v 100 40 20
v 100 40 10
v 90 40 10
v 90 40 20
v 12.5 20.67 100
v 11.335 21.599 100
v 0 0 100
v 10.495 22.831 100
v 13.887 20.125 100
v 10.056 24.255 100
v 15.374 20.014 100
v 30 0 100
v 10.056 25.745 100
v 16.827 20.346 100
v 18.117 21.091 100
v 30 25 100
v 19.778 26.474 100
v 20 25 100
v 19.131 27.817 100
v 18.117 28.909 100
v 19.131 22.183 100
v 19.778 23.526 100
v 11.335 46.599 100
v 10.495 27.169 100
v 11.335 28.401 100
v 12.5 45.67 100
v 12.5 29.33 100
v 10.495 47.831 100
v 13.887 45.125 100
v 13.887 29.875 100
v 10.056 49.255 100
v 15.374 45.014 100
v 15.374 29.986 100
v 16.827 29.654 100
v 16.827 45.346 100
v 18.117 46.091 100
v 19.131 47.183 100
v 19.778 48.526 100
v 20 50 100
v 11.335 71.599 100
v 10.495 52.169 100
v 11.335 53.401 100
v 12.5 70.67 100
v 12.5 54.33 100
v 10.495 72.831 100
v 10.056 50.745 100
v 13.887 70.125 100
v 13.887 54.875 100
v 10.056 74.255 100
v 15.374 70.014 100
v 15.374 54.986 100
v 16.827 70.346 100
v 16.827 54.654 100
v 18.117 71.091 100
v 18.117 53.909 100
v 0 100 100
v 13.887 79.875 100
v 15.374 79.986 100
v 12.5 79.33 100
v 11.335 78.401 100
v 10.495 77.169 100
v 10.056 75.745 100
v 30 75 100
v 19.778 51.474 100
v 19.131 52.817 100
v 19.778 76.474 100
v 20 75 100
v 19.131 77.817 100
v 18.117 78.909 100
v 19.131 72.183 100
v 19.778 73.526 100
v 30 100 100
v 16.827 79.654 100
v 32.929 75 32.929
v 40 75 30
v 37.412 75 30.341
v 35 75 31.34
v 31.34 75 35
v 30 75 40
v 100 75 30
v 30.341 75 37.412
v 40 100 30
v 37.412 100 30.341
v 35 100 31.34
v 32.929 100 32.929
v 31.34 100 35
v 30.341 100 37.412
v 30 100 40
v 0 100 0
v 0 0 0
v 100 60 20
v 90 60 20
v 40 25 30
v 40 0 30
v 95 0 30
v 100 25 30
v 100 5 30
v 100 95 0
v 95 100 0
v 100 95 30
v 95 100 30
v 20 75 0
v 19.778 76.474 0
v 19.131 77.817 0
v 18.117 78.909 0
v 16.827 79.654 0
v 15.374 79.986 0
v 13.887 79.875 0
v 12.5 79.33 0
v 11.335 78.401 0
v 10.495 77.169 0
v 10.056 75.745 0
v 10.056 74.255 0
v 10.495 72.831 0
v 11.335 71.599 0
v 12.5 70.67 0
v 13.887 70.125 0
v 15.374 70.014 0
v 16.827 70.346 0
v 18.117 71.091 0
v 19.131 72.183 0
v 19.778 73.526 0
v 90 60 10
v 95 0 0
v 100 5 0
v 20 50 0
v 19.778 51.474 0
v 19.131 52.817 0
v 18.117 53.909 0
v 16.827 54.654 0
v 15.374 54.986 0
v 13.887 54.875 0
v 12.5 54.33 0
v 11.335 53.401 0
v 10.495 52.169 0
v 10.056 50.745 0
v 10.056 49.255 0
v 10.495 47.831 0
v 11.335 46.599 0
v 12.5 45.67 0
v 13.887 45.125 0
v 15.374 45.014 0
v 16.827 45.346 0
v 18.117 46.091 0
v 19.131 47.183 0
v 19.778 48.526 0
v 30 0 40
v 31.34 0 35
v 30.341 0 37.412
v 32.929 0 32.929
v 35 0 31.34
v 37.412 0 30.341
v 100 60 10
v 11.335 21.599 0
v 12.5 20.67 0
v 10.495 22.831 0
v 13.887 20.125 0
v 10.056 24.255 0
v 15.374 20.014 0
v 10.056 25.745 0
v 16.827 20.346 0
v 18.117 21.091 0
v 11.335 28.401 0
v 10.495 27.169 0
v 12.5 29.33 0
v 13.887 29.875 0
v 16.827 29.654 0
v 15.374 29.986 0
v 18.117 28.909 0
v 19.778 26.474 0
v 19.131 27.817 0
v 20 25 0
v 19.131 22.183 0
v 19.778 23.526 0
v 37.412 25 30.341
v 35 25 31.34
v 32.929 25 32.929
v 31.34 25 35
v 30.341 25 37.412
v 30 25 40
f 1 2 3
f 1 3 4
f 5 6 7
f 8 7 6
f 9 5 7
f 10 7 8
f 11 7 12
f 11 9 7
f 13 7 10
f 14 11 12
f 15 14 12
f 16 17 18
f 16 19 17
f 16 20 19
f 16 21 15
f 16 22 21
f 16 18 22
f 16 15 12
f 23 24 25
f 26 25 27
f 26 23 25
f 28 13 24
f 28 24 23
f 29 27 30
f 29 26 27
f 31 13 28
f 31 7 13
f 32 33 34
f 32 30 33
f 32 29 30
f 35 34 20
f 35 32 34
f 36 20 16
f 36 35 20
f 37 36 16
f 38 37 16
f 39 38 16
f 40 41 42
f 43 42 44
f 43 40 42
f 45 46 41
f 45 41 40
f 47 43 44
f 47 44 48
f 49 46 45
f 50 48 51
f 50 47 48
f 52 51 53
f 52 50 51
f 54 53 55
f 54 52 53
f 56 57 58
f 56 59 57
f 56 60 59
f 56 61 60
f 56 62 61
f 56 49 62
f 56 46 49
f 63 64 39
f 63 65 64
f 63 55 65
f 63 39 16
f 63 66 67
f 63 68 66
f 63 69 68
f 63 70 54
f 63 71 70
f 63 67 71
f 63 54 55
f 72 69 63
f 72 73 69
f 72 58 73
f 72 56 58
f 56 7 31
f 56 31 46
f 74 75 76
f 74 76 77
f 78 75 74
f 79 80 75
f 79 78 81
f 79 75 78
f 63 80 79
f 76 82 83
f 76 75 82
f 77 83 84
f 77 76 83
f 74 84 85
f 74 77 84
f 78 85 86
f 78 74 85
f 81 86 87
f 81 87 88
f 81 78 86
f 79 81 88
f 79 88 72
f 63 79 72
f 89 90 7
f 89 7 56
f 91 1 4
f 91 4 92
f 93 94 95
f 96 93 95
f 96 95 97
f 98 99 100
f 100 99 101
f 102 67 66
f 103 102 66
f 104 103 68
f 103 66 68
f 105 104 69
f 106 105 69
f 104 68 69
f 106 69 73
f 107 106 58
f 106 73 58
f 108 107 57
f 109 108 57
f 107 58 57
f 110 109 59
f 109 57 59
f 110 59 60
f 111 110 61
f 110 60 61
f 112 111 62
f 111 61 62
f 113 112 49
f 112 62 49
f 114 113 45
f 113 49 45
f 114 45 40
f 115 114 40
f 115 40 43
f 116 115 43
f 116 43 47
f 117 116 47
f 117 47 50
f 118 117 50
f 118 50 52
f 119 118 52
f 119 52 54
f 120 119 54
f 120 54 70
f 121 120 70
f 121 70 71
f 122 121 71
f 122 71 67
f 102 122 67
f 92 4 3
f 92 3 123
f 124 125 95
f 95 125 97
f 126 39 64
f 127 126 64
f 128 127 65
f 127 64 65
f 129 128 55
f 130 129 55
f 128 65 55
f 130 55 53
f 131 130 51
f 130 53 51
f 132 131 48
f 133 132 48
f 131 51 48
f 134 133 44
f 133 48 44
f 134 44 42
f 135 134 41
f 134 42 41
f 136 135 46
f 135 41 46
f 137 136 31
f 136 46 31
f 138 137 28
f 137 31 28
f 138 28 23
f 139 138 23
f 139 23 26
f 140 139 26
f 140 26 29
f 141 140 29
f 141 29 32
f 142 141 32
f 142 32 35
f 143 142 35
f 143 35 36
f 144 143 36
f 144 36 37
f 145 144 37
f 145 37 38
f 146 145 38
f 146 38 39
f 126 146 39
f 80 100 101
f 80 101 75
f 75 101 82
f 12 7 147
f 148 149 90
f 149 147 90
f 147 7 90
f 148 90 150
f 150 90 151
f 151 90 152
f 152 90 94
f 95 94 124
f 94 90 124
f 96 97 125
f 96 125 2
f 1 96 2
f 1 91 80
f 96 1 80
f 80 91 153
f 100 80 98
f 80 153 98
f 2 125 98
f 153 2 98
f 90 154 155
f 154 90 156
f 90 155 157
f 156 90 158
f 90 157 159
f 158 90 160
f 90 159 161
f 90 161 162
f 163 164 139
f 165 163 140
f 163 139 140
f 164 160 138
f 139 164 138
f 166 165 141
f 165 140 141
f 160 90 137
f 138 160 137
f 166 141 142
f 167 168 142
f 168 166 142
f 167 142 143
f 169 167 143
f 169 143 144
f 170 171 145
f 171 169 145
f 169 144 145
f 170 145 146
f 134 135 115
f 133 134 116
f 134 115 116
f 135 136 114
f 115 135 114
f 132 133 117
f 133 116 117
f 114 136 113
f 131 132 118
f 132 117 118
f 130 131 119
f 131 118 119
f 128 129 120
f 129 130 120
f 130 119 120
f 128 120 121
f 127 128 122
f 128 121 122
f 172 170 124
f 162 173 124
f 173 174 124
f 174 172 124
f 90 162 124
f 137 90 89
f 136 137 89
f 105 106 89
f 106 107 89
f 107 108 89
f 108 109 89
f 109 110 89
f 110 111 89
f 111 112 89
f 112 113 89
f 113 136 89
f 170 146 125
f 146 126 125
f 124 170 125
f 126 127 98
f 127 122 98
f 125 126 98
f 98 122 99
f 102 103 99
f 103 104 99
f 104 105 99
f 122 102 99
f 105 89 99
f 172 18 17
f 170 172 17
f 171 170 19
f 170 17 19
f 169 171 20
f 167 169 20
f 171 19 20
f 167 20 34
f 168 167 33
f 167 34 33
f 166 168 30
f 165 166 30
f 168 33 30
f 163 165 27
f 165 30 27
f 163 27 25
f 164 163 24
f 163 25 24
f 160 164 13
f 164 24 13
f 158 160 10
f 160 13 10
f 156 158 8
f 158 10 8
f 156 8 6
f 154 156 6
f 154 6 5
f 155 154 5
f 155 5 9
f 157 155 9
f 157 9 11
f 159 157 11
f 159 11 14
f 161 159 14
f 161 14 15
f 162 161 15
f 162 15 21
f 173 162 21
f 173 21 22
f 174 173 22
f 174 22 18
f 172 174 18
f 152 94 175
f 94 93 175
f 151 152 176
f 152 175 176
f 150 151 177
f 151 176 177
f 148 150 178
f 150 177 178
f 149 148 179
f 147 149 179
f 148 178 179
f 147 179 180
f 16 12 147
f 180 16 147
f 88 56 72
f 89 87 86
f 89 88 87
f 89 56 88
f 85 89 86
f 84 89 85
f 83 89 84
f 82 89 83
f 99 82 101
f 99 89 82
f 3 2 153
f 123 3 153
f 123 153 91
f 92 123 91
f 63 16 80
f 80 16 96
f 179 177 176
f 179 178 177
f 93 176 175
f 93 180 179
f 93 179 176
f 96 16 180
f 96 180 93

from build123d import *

# Parameters (mm, degrees)
F0_W      = 100
F0_H      = 100
F1_DEPTH  = 100
F2_W      = 20
F2_H      = 10
F3_DEPTH  = 10
F4_R      = 5
F5_DEPTH  = 100.001
F7_DEPTH  = 100.001
F9_DEPTH  = 25
F11_DEPTH = 25
F12_R     = 10
F13_SIZE  = 5


with BuildPart() as f1:
    # F0 (on Top) → F1 (new body)
    with BuildSketch(Plane.XY):
        with Locations((50, 50)):
            Rectangle(F0_W, F0_H)
    extrude(amount=F1_DEPTH)

    # F2 (on face) → F3 (cut)
    with BuildSketch(Plane.YZ.offset(100)):
        with Locations((50, 15)):
            Rectangle(F2_W, F2_H)
    extrude(amount=-F3_DEPTH, mode=Mode.SUBTRACT)

    # F4 (on face) → F5 (cut, through all)
    with BuildSketch(Plane.XY.offset(100)):
        with Locations((15, 75)):
            Circle(F4_R)
        with Locations((15, 50)):
            Circle(F4_R)
        with Locations((15, 25)):
            Circle(F4_R)
    extrude(amount=-F5_DEPTH, mode=Mode.SUBTRACT)

    # F6 (on face) → F7 (cut, through all)
    with BuildSketch(Plane.XZ):
        Polygon((100, 30), (100, 100), (30, 100), align=None)
    extrude(amount=-F7_DEPTH, mode=Mode.SUBTRACT)

    # F8 (on face) → F9 (cut)
    with BuildSketch(Plane.XZ):
        Polygon((100, 30), (30, 100), (30, 30), align=None)
    extrude(amount=-F9_DEPTH, mode=Mode.SUBTRACT)

    # F10 (on face) → F11 (cut)
    with BuildSketch(Plane(origin=(0, 100, 0), x_dir=(-1, 0, 0), z_dir=(0, 1, 0))):
        Polygon((-30, 100), (-100, 30), (-30, 30), align=None)
    extrude(amount=-F11_DEPTH, mode=Mode.SUBTRACT)

    # F12
    f12_edges = [f1.edges().sort_by_distance(p)[0] for p in [
        (30, 12.5, 30),
        (30, 87.5, 30),
    ]]
    fillet(f12_edges, radius=F12_R)

    # F13
    f13_edges = [f1.edges().sort_by_distance(p)[0] for p in [
        (100, 0, 15),
        (100, 100, 15),
    ]]
    chamfer(f13_edges, length=F13_SIZE)


solid = f1.part
